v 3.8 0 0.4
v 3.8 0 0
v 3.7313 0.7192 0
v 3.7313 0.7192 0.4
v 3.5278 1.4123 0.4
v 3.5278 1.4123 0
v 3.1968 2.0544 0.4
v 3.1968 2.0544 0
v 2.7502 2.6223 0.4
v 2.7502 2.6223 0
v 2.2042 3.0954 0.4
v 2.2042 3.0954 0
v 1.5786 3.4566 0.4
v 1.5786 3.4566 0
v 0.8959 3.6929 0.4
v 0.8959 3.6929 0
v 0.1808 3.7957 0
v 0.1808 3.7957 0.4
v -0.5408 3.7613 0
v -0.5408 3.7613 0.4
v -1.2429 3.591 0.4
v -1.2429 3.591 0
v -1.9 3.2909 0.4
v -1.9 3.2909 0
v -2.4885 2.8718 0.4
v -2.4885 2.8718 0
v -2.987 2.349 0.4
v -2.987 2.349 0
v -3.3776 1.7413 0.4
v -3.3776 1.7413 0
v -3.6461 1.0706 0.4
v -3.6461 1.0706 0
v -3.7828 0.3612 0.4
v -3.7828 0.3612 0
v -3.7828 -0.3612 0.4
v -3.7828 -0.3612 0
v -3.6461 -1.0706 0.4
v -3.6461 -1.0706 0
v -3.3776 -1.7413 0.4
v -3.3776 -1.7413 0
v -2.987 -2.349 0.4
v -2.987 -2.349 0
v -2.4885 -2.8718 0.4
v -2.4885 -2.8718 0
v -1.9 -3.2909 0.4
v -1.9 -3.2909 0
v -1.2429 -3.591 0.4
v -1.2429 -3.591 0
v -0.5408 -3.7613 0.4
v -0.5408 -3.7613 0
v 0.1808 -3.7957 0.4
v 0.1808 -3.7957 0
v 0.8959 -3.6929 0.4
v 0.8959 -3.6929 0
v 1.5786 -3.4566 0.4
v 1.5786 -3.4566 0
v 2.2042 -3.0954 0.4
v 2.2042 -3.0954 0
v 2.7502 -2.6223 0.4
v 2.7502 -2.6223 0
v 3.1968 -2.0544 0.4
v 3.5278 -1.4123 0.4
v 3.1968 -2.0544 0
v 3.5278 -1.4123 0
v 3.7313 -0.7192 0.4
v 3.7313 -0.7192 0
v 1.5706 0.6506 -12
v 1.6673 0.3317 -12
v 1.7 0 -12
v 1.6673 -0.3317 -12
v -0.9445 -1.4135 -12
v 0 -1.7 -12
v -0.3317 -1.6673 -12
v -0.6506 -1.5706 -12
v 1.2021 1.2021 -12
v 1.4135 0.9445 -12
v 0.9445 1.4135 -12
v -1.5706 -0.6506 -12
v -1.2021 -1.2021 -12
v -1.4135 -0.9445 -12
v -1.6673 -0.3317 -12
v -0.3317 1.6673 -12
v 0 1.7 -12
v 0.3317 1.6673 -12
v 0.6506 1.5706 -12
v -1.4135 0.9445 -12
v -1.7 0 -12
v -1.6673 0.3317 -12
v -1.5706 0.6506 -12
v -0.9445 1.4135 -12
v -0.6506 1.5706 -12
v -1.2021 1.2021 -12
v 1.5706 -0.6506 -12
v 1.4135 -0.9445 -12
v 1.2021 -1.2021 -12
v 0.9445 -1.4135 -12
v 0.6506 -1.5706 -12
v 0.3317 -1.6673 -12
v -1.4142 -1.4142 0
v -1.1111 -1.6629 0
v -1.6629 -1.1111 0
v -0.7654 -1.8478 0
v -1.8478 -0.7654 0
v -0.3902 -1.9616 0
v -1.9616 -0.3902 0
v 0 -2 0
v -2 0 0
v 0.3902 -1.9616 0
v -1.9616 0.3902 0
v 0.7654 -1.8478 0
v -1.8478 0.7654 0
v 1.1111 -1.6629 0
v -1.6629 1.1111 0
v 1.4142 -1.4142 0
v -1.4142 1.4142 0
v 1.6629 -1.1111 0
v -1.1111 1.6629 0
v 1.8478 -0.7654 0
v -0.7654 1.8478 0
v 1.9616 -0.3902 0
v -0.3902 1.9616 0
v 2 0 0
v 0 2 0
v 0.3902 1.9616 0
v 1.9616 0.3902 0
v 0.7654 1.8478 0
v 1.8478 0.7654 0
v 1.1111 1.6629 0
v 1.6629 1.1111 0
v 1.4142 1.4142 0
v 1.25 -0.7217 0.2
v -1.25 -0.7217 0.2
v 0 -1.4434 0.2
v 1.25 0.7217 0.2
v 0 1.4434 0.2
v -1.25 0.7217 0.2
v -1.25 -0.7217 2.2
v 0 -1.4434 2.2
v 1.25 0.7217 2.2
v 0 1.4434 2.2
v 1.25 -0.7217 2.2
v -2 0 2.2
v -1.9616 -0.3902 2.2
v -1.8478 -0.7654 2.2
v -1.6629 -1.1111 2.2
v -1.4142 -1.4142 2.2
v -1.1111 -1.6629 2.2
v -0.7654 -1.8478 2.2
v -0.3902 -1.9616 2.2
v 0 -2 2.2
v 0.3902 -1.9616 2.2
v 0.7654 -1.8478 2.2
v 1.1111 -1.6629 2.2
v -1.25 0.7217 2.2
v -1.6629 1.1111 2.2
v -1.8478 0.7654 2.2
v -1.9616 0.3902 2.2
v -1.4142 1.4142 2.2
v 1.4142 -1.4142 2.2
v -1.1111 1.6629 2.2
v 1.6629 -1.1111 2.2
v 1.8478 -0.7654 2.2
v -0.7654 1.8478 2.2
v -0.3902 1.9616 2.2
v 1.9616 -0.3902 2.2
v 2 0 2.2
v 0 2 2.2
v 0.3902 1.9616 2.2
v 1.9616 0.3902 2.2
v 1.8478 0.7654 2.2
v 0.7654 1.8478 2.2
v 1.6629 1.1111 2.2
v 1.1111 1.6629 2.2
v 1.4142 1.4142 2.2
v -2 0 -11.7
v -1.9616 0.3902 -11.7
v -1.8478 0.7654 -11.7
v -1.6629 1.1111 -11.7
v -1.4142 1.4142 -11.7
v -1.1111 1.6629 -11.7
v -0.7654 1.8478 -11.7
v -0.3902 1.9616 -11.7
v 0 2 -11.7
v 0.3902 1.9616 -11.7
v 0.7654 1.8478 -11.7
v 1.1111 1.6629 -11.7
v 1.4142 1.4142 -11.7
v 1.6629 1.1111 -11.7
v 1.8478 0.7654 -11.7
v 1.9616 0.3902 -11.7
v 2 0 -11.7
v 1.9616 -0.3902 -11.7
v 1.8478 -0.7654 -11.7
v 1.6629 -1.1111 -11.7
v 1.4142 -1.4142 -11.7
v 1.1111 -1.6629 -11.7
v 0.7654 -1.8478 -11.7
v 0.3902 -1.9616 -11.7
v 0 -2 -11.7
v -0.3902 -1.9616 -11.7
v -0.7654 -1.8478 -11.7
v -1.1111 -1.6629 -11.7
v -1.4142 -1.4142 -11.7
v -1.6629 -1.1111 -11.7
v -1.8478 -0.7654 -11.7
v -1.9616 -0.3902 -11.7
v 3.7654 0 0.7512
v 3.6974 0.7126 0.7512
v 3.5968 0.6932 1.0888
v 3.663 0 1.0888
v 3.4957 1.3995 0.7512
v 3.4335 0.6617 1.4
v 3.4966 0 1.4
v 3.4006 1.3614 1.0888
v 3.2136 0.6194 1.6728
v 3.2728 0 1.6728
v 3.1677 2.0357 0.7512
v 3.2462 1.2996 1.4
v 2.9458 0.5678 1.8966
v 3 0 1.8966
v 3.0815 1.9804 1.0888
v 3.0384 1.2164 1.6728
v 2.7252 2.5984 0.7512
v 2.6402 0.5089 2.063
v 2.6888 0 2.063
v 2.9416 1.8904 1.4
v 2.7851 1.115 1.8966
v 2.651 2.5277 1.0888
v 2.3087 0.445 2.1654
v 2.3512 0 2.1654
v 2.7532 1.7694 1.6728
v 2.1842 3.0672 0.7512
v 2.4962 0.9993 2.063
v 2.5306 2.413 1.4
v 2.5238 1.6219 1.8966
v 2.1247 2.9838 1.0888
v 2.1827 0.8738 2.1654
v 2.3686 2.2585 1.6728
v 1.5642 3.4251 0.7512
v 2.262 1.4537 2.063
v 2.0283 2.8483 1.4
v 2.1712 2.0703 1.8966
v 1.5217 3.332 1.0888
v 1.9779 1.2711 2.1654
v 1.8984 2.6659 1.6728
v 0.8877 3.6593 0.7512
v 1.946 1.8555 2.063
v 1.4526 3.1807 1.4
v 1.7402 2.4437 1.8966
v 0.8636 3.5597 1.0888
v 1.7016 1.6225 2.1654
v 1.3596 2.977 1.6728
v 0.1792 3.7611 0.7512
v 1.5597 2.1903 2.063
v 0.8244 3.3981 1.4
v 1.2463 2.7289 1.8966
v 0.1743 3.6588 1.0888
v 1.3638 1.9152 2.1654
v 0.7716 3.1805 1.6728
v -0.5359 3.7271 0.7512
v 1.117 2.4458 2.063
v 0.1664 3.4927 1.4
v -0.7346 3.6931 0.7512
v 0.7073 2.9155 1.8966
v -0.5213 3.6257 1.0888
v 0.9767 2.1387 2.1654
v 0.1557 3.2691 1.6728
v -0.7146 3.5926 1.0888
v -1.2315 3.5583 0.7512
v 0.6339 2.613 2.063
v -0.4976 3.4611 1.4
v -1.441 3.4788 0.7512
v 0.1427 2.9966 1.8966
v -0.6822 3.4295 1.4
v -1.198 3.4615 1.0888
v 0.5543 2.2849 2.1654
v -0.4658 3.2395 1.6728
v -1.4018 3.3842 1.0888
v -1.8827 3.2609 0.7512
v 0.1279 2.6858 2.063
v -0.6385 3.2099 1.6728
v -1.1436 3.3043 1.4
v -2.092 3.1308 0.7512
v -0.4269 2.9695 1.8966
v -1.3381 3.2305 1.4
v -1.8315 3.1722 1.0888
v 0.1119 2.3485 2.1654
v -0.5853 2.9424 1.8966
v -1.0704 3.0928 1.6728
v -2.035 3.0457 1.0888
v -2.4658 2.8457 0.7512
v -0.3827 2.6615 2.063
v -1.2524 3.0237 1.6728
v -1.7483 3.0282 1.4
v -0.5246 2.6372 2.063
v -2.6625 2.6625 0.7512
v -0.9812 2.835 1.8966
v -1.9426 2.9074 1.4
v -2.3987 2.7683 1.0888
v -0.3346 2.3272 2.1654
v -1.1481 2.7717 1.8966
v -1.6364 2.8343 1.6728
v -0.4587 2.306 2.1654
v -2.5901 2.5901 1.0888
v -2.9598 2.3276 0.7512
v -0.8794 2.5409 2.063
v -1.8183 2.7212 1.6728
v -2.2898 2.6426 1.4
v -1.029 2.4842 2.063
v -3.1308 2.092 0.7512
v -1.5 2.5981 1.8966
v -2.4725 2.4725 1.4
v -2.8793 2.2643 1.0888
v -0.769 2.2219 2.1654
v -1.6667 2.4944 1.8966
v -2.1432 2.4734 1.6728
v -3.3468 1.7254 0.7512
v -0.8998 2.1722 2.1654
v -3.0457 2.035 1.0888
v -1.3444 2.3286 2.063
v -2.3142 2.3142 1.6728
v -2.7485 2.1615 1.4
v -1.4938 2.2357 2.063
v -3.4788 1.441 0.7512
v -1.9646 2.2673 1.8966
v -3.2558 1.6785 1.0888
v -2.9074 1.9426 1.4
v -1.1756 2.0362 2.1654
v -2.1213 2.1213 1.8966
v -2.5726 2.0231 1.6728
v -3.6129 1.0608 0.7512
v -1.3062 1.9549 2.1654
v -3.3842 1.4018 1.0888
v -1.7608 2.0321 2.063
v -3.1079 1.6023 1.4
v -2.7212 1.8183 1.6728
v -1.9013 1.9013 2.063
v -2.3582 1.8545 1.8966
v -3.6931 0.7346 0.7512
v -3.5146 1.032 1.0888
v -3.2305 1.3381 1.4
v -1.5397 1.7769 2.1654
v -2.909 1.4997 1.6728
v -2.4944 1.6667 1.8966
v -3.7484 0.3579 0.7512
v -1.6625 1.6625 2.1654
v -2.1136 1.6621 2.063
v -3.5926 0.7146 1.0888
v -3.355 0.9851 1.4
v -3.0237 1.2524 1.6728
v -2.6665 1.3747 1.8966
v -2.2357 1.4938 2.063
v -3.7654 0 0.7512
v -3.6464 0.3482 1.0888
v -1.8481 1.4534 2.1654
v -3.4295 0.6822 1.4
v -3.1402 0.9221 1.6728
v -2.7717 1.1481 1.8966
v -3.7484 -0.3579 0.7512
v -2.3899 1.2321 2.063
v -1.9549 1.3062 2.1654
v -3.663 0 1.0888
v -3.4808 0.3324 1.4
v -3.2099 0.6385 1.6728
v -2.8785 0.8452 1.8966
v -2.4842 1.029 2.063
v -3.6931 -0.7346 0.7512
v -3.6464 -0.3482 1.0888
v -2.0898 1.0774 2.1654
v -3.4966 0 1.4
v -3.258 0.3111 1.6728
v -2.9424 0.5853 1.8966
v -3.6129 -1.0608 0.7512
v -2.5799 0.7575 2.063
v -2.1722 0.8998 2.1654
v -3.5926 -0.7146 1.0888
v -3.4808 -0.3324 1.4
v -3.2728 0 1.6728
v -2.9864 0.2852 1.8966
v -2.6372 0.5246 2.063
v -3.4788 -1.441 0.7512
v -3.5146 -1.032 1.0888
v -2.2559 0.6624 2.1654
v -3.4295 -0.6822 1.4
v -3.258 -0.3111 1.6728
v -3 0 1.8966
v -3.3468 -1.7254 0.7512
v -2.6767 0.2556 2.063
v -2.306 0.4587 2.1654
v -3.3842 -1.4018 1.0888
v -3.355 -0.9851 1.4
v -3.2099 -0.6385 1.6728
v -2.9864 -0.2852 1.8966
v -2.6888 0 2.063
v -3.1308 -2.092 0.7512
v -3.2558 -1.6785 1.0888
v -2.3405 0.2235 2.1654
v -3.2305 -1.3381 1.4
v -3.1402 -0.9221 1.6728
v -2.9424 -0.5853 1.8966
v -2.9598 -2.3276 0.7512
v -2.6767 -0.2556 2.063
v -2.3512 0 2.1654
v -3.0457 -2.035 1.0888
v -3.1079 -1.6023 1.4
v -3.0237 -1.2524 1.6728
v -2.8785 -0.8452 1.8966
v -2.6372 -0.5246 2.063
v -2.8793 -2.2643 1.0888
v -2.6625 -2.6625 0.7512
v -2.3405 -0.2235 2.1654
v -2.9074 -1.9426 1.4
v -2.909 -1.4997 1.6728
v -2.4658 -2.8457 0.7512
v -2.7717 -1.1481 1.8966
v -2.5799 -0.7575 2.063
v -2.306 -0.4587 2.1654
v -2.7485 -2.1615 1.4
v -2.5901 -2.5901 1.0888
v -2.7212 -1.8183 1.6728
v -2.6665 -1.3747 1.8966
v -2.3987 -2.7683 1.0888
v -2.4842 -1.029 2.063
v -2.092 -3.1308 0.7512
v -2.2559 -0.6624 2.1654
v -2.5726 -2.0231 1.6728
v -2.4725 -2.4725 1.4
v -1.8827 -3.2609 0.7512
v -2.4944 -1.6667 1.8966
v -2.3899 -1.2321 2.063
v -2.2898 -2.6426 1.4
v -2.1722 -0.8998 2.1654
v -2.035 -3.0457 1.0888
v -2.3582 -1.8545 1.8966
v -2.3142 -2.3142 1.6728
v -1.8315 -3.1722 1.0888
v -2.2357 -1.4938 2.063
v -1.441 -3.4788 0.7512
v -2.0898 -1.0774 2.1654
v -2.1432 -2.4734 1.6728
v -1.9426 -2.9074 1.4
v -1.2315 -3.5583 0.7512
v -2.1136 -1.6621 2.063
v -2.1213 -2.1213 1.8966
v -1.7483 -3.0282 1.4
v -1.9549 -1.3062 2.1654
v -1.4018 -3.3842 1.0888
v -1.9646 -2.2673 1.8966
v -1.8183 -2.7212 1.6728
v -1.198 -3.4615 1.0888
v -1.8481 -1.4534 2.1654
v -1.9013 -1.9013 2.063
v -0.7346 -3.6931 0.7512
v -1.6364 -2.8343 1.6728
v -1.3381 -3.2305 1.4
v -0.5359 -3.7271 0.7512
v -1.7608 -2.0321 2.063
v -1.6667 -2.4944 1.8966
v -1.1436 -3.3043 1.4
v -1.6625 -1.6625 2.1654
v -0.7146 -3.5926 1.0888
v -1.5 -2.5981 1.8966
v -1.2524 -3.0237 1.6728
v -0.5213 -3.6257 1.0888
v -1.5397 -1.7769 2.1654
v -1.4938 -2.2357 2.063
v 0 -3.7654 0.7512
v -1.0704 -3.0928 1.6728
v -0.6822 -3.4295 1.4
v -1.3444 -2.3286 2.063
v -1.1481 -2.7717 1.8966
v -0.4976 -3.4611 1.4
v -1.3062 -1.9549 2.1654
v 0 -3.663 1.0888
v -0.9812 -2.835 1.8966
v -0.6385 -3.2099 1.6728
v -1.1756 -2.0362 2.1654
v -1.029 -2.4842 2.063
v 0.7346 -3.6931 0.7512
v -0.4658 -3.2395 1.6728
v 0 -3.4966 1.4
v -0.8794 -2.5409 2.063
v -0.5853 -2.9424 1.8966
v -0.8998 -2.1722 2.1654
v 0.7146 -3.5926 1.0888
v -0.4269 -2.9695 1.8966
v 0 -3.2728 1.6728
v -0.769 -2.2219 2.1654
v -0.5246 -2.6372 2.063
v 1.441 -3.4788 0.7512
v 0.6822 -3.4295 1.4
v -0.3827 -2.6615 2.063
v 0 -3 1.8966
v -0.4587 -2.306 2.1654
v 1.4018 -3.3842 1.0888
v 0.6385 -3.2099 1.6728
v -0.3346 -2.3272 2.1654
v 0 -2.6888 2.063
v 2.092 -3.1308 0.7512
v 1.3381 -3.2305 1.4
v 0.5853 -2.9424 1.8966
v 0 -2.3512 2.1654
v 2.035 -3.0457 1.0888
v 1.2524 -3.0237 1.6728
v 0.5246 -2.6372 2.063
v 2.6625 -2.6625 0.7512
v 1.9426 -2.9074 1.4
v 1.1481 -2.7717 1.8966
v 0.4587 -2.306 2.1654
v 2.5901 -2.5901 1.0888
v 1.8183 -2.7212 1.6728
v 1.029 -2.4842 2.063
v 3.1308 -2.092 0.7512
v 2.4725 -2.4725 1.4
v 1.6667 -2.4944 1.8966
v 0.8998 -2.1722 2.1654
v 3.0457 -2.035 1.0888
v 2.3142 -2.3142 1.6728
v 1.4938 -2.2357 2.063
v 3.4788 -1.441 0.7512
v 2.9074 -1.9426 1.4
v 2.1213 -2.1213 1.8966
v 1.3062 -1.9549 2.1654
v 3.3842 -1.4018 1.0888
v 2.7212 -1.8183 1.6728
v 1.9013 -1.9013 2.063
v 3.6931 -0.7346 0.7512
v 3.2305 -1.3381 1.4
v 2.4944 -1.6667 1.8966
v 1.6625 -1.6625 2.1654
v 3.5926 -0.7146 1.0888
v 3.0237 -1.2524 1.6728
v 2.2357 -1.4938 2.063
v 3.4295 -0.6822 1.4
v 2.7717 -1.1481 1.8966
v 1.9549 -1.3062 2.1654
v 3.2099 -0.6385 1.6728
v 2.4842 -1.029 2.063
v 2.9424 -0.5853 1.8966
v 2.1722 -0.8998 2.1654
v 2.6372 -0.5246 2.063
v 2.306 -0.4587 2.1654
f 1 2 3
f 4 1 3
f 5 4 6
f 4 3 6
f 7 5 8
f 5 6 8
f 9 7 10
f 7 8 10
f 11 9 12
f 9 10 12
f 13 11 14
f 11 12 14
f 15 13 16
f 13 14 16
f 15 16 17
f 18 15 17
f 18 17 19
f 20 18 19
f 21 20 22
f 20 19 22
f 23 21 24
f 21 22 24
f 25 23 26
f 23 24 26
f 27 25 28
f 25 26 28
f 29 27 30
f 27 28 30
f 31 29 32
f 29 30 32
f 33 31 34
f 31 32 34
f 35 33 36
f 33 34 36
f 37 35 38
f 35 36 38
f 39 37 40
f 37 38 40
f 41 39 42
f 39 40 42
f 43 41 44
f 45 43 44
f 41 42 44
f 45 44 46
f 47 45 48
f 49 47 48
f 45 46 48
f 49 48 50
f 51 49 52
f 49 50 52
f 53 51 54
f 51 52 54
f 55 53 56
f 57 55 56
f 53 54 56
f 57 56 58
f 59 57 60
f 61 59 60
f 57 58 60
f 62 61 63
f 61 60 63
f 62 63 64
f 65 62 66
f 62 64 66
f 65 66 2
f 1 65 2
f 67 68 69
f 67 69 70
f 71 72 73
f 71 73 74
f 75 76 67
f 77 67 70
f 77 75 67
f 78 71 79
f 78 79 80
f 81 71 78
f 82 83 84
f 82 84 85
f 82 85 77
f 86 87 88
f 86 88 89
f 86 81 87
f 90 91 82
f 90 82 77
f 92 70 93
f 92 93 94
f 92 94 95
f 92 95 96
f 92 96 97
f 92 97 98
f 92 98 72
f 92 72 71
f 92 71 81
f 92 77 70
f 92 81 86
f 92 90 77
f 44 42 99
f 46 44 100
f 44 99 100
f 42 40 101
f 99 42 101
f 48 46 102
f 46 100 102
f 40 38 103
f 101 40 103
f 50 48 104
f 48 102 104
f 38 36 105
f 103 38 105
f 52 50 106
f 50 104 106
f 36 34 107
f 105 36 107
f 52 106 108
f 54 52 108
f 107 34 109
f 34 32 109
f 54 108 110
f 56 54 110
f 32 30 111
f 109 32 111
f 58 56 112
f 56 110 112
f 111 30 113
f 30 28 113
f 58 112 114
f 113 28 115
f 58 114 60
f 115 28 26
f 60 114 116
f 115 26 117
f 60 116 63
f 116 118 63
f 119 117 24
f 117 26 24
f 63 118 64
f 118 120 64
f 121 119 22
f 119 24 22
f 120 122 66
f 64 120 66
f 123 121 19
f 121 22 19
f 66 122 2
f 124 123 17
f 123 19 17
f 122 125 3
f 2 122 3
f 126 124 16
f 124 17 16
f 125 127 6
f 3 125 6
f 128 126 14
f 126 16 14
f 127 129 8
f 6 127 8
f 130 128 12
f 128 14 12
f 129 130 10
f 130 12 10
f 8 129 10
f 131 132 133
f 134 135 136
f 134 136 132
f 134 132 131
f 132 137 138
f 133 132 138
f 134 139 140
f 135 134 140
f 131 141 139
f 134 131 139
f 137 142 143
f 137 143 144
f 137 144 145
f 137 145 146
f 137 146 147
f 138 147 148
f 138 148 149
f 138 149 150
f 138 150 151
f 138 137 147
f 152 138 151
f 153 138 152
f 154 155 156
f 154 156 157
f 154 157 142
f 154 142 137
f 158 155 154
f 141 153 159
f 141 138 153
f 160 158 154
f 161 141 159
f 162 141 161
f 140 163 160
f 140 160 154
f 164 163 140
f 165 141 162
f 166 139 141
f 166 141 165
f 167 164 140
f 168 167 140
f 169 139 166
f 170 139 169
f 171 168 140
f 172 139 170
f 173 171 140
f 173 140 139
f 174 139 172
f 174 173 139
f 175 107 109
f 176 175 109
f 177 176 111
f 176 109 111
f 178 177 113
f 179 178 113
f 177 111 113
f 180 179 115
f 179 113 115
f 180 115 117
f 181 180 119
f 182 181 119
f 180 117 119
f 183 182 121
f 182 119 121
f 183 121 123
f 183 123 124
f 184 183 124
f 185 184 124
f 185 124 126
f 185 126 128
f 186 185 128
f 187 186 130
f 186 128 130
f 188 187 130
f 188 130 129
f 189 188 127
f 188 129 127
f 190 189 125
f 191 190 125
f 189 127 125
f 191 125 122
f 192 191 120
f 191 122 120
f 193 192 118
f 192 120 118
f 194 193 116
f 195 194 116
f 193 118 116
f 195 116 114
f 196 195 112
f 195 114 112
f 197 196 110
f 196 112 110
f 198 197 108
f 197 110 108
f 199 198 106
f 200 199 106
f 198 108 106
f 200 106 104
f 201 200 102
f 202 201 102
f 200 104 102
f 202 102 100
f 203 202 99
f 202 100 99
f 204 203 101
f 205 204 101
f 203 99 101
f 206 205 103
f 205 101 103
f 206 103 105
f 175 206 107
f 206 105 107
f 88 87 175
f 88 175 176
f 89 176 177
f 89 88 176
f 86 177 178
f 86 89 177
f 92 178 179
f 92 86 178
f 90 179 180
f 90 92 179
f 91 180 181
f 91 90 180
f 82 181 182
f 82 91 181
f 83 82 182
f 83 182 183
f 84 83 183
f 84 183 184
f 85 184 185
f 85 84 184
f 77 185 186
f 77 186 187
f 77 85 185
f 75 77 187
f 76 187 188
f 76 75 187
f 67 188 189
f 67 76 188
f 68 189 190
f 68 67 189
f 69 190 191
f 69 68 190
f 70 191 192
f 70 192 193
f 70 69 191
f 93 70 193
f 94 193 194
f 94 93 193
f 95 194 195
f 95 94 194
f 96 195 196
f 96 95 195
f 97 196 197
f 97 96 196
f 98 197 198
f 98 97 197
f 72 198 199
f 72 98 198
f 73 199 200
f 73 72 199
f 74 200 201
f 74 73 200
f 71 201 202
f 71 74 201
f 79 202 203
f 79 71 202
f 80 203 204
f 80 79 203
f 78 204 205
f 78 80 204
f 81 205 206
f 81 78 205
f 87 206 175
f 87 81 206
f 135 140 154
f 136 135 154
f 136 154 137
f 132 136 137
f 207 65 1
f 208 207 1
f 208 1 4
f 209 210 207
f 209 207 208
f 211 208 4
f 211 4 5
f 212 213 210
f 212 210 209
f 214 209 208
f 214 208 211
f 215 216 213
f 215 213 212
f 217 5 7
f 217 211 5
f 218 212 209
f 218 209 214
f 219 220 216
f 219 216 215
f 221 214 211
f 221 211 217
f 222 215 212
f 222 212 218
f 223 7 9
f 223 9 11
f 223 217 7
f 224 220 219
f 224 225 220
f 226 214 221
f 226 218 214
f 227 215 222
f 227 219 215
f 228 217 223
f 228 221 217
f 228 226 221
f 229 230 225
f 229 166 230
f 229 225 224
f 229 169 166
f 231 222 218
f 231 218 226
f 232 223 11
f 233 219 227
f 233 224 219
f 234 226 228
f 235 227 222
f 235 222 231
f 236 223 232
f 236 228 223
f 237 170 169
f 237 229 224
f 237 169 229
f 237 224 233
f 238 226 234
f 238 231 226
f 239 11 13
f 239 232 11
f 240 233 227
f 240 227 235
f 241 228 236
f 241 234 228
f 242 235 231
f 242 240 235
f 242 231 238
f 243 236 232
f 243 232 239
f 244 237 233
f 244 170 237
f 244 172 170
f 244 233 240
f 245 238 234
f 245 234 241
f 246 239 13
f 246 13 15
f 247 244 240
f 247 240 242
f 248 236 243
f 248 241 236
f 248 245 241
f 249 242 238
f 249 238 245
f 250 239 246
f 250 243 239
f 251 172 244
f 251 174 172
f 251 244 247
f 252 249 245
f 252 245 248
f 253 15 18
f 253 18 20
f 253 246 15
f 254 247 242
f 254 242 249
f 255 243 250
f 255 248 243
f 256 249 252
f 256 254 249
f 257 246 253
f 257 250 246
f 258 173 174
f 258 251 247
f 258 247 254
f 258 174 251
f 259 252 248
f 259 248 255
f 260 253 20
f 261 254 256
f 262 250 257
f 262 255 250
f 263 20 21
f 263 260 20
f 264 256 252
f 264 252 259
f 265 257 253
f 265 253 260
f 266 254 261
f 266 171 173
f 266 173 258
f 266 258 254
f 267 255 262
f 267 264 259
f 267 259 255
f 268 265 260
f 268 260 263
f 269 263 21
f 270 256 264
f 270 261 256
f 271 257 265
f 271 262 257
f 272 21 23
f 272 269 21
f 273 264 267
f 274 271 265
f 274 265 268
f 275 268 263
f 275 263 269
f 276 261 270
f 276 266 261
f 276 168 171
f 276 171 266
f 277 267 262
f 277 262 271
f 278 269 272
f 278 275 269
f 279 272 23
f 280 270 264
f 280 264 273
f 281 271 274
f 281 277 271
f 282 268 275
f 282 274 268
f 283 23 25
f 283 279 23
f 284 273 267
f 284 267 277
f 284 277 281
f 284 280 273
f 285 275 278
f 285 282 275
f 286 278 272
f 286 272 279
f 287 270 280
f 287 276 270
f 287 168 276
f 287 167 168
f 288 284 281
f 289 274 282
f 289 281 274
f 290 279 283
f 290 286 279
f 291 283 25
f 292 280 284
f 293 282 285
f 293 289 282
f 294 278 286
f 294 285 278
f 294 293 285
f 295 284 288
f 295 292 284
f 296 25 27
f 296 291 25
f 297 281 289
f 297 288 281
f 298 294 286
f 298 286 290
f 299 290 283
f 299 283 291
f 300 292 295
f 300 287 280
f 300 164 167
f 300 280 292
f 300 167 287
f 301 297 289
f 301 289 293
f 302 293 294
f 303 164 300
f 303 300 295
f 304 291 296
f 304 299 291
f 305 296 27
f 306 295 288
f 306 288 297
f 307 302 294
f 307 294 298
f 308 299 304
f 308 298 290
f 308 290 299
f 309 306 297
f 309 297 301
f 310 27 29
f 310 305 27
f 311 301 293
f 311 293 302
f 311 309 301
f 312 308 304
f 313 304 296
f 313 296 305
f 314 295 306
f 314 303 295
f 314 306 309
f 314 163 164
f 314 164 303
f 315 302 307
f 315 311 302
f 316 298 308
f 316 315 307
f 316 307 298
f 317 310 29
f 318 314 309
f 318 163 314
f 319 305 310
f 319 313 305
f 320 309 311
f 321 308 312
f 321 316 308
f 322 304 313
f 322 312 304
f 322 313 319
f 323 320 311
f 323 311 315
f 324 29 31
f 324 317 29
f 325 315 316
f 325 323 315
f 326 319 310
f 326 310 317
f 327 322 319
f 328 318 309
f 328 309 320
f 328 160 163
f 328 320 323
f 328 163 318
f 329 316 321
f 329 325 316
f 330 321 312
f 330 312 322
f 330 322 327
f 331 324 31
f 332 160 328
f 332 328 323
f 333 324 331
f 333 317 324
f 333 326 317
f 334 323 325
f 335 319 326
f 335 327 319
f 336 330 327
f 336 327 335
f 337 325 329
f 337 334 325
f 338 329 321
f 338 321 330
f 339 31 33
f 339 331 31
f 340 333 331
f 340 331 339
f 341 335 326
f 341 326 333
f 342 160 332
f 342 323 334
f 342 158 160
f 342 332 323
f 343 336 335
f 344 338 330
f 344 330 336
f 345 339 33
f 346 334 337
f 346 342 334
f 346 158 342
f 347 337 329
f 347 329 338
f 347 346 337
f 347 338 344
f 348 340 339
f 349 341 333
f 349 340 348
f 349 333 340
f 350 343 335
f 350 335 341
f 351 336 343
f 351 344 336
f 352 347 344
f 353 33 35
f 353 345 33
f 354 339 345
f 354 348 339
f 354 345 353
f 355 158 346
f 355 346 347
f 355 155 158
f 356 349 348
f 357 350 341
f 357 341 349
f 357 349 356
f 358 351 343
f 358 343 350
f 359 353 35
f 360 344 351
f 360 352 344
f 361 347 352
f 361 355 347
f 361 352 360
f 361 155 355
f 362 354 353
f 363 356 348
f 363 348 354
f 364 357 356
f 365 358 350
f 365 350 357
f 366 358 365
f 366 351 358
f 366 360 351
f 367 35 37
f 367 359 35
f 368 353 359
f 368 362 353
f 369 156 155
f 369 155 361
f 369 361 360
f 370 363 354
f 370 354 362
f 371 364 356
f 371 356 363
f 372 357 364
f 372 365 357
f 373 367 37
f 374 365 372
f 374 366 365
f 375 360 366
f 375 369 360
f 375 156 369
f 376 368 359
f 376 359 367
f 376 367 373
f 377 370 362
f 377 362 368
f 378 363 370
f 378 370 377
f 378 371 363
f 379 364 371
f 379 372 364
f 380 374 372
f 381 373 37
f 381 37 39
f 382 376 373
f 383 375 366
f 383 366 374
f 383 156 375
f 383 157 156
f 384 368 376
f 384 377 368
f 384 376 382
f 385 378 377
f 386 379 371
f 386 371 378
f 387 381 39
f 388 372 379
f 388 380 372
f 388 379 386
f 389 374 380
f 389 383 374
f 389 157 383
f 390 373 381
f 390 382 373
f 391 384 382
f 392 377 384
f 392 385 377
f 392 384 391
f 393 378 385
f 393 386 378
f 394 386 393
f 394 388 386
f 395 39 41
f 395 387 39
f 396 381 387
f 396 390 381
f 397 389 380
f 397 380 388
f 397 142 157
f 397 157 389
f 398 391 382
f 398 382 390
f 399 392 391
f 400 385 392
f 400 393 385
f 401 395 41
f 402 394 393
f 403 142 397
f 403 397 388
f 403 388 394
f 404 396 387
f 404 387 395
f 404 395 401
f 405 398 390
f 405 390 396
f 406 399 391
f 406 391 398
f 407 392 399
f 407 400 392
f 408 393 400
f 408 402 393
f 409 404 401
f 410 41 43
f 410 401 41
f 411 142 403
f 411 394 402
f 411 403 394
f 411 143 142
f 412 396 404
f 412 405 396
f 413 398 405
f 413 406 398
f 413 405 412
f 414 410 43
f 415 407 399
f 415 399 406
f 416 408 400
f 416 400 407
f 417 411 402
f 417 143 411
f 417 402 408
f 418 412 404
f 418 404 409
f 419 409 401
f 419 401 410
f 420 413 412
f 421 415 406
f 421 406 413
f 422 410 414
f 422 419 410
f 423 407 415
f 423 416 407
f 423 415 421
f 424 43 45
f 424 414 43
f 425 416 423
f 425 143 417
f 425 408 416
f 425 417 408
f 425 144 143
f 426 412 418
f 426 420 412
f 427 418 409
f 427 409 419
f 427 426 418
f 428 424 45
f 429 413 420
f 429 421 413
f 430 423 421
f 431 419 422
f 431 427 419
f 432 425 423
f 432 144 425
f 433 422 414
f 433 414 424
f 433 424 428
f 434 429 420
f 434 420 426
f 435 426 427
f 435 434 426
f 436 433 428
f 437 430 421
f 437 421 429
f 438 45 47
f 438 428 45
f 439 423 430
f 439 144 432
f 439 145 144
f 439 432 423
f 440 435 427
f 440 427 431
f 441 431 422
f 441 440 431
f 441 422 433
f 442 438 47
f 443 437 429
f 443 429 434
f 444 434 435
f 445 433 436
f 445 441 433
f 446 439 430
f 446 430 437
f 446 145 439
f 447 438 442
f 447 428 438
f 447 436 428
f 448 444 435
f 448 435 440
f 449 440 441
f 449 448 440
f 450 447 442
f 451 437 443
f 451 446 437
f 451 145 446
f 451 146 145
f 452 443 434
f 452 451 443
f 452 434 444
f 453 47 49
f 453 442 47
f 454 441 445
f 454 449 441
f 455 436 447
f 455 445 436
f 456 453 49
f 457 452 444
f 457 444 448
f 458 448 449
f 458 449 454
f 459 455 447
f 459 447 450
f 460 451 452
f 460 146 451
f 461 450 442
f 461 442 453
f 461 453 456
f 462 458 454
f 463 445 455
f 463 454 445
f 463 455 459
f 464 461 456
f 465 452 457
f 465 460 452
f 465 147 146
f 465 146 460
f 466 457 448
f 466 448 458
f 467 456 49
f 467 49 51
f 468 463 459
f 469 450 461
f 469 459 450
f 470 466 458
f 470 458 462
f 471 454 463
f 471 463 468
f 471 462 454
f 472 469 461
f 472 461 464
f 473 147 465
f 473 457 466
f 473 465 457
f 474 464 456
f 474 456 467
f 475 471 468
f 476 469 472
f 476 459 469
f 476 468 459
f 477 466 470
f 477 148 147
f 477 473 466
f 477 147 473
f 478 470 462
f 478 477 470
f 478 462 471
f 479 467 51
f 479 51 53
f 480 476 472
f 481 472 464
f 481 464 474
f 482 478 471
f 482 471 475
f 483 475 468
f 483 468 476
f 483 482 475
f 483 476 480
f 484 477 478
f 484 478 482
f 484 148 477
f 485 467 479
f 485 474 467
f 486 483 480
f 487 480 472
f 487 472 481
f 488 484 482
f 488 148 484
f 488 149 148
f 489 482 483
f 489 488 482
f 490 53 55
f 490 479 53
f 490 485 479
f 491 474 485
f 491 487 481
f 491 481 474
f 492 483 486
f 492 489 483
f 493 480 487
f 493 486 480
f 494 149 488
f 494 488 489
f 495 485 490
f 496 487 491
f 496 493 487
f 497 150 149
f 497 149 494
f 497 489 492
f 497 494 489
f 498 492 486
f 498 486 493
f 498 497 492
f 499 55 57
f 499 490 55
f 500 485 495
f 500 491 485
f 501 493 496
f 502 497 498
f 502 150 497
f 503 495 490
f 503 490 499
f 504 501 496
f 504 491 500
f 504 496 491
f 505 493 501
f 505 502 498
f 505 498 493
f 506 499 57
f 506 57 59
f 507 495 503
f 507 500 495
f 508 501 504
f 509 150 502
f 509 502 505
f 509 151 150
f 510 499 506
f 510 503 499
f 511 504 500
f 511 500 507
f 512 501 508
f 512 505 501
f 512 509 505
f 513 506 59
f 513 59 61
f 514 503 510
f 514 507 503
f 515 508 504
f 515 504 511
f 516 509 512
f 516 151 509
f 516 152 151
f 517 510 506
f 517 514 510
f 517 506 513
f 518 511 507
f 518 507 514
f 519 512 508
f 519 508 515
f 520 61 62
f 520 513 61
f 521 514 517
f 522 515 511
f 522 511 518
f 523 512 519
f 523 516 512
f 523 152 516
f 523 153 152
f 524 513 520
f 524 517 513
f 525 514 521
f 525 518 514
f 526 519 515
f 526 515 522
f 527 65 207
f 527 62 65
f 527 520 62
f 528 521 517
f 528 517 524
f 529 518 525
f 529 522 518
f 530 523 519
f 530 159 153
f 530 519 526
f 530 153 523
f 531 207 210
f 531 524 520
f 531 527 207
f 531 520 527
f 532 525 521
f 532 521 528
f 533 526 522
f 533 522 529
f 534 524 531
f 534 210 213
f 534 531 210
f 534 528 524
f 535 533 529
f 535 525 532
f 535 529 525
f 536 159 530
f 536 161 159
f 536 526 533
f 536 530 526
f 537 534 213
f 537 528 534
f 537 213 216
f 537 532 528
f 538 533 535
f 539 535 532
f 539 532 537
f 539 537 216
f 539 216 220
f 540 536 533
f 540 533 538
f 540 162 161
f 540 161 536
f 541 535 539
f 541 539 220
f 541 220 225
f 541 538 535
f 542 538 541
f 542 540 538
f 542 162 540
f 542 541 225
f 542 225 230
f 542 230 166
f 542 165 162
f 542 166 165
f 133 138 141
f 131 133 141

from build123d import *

# Parameters (mm, degrees)
SKETCH1_R           = 3.8
BOSS_EXTRUDE1_DEPTH = 2.2
SKETCH2_R           = 2
BOSS_EXTRUDE2_DEPTH = 12
CHAMFER1_SIZE       = 0.3
CUT_EXTRUDE1_DEPTH  = 2
FILLET1_R           = 1.8


with BuildPart() as part:
    # Sketch1 → Boss-Extrude1 (new body)
    with BuildSketch(Plane.XY):
        Circle(SKETCH1_R)
    extrude(amount=BOSS_EXTRUDE1_DEPTH)

    # Sketch2 → Boss-Extrude2 (add)
    with BuildSketch(Plane(origin=(0, 0, 0), x_dir=(-1, 0, 0), z_dir=(0, 0, -1))):
        Circle(SKETCH2_R)
    extrude(amount=BOSS_EXTRUDE2_DEPTH)

    # Chamfer1
    chamfer1_edges = [part.edges().sort_by_distance(p)[0] for p in [
        (2, 0, -12),
    ]]
    chamfer(chamfer1_edges, length=CHAMFER1_SIZE)

    # Sketch3 → Cut-Extrude1 (cut)
    with BuildSketch(Plane.XY.offset(2.2)):
        Polygon((0, 1.443375673), (-1.25, 0.721687836), (-1.25, -0.721687836), (0, -1.443375673), (1.25, -0.721687836), (1.25, 0.721687836), align=None)
    extrude(amount=-CUT_EXTRUDE1_DEPTH, mode=Mode.SUBTRACT)

    # Fillet1
    fillet1_edges = [part.edges().sort_by_distance(p)[0] for p in [
        (-3.8, 0, 2.2),
    ]]
    fillet(fillet1_edges, radius=FILLET1_R)


solid = part.part
